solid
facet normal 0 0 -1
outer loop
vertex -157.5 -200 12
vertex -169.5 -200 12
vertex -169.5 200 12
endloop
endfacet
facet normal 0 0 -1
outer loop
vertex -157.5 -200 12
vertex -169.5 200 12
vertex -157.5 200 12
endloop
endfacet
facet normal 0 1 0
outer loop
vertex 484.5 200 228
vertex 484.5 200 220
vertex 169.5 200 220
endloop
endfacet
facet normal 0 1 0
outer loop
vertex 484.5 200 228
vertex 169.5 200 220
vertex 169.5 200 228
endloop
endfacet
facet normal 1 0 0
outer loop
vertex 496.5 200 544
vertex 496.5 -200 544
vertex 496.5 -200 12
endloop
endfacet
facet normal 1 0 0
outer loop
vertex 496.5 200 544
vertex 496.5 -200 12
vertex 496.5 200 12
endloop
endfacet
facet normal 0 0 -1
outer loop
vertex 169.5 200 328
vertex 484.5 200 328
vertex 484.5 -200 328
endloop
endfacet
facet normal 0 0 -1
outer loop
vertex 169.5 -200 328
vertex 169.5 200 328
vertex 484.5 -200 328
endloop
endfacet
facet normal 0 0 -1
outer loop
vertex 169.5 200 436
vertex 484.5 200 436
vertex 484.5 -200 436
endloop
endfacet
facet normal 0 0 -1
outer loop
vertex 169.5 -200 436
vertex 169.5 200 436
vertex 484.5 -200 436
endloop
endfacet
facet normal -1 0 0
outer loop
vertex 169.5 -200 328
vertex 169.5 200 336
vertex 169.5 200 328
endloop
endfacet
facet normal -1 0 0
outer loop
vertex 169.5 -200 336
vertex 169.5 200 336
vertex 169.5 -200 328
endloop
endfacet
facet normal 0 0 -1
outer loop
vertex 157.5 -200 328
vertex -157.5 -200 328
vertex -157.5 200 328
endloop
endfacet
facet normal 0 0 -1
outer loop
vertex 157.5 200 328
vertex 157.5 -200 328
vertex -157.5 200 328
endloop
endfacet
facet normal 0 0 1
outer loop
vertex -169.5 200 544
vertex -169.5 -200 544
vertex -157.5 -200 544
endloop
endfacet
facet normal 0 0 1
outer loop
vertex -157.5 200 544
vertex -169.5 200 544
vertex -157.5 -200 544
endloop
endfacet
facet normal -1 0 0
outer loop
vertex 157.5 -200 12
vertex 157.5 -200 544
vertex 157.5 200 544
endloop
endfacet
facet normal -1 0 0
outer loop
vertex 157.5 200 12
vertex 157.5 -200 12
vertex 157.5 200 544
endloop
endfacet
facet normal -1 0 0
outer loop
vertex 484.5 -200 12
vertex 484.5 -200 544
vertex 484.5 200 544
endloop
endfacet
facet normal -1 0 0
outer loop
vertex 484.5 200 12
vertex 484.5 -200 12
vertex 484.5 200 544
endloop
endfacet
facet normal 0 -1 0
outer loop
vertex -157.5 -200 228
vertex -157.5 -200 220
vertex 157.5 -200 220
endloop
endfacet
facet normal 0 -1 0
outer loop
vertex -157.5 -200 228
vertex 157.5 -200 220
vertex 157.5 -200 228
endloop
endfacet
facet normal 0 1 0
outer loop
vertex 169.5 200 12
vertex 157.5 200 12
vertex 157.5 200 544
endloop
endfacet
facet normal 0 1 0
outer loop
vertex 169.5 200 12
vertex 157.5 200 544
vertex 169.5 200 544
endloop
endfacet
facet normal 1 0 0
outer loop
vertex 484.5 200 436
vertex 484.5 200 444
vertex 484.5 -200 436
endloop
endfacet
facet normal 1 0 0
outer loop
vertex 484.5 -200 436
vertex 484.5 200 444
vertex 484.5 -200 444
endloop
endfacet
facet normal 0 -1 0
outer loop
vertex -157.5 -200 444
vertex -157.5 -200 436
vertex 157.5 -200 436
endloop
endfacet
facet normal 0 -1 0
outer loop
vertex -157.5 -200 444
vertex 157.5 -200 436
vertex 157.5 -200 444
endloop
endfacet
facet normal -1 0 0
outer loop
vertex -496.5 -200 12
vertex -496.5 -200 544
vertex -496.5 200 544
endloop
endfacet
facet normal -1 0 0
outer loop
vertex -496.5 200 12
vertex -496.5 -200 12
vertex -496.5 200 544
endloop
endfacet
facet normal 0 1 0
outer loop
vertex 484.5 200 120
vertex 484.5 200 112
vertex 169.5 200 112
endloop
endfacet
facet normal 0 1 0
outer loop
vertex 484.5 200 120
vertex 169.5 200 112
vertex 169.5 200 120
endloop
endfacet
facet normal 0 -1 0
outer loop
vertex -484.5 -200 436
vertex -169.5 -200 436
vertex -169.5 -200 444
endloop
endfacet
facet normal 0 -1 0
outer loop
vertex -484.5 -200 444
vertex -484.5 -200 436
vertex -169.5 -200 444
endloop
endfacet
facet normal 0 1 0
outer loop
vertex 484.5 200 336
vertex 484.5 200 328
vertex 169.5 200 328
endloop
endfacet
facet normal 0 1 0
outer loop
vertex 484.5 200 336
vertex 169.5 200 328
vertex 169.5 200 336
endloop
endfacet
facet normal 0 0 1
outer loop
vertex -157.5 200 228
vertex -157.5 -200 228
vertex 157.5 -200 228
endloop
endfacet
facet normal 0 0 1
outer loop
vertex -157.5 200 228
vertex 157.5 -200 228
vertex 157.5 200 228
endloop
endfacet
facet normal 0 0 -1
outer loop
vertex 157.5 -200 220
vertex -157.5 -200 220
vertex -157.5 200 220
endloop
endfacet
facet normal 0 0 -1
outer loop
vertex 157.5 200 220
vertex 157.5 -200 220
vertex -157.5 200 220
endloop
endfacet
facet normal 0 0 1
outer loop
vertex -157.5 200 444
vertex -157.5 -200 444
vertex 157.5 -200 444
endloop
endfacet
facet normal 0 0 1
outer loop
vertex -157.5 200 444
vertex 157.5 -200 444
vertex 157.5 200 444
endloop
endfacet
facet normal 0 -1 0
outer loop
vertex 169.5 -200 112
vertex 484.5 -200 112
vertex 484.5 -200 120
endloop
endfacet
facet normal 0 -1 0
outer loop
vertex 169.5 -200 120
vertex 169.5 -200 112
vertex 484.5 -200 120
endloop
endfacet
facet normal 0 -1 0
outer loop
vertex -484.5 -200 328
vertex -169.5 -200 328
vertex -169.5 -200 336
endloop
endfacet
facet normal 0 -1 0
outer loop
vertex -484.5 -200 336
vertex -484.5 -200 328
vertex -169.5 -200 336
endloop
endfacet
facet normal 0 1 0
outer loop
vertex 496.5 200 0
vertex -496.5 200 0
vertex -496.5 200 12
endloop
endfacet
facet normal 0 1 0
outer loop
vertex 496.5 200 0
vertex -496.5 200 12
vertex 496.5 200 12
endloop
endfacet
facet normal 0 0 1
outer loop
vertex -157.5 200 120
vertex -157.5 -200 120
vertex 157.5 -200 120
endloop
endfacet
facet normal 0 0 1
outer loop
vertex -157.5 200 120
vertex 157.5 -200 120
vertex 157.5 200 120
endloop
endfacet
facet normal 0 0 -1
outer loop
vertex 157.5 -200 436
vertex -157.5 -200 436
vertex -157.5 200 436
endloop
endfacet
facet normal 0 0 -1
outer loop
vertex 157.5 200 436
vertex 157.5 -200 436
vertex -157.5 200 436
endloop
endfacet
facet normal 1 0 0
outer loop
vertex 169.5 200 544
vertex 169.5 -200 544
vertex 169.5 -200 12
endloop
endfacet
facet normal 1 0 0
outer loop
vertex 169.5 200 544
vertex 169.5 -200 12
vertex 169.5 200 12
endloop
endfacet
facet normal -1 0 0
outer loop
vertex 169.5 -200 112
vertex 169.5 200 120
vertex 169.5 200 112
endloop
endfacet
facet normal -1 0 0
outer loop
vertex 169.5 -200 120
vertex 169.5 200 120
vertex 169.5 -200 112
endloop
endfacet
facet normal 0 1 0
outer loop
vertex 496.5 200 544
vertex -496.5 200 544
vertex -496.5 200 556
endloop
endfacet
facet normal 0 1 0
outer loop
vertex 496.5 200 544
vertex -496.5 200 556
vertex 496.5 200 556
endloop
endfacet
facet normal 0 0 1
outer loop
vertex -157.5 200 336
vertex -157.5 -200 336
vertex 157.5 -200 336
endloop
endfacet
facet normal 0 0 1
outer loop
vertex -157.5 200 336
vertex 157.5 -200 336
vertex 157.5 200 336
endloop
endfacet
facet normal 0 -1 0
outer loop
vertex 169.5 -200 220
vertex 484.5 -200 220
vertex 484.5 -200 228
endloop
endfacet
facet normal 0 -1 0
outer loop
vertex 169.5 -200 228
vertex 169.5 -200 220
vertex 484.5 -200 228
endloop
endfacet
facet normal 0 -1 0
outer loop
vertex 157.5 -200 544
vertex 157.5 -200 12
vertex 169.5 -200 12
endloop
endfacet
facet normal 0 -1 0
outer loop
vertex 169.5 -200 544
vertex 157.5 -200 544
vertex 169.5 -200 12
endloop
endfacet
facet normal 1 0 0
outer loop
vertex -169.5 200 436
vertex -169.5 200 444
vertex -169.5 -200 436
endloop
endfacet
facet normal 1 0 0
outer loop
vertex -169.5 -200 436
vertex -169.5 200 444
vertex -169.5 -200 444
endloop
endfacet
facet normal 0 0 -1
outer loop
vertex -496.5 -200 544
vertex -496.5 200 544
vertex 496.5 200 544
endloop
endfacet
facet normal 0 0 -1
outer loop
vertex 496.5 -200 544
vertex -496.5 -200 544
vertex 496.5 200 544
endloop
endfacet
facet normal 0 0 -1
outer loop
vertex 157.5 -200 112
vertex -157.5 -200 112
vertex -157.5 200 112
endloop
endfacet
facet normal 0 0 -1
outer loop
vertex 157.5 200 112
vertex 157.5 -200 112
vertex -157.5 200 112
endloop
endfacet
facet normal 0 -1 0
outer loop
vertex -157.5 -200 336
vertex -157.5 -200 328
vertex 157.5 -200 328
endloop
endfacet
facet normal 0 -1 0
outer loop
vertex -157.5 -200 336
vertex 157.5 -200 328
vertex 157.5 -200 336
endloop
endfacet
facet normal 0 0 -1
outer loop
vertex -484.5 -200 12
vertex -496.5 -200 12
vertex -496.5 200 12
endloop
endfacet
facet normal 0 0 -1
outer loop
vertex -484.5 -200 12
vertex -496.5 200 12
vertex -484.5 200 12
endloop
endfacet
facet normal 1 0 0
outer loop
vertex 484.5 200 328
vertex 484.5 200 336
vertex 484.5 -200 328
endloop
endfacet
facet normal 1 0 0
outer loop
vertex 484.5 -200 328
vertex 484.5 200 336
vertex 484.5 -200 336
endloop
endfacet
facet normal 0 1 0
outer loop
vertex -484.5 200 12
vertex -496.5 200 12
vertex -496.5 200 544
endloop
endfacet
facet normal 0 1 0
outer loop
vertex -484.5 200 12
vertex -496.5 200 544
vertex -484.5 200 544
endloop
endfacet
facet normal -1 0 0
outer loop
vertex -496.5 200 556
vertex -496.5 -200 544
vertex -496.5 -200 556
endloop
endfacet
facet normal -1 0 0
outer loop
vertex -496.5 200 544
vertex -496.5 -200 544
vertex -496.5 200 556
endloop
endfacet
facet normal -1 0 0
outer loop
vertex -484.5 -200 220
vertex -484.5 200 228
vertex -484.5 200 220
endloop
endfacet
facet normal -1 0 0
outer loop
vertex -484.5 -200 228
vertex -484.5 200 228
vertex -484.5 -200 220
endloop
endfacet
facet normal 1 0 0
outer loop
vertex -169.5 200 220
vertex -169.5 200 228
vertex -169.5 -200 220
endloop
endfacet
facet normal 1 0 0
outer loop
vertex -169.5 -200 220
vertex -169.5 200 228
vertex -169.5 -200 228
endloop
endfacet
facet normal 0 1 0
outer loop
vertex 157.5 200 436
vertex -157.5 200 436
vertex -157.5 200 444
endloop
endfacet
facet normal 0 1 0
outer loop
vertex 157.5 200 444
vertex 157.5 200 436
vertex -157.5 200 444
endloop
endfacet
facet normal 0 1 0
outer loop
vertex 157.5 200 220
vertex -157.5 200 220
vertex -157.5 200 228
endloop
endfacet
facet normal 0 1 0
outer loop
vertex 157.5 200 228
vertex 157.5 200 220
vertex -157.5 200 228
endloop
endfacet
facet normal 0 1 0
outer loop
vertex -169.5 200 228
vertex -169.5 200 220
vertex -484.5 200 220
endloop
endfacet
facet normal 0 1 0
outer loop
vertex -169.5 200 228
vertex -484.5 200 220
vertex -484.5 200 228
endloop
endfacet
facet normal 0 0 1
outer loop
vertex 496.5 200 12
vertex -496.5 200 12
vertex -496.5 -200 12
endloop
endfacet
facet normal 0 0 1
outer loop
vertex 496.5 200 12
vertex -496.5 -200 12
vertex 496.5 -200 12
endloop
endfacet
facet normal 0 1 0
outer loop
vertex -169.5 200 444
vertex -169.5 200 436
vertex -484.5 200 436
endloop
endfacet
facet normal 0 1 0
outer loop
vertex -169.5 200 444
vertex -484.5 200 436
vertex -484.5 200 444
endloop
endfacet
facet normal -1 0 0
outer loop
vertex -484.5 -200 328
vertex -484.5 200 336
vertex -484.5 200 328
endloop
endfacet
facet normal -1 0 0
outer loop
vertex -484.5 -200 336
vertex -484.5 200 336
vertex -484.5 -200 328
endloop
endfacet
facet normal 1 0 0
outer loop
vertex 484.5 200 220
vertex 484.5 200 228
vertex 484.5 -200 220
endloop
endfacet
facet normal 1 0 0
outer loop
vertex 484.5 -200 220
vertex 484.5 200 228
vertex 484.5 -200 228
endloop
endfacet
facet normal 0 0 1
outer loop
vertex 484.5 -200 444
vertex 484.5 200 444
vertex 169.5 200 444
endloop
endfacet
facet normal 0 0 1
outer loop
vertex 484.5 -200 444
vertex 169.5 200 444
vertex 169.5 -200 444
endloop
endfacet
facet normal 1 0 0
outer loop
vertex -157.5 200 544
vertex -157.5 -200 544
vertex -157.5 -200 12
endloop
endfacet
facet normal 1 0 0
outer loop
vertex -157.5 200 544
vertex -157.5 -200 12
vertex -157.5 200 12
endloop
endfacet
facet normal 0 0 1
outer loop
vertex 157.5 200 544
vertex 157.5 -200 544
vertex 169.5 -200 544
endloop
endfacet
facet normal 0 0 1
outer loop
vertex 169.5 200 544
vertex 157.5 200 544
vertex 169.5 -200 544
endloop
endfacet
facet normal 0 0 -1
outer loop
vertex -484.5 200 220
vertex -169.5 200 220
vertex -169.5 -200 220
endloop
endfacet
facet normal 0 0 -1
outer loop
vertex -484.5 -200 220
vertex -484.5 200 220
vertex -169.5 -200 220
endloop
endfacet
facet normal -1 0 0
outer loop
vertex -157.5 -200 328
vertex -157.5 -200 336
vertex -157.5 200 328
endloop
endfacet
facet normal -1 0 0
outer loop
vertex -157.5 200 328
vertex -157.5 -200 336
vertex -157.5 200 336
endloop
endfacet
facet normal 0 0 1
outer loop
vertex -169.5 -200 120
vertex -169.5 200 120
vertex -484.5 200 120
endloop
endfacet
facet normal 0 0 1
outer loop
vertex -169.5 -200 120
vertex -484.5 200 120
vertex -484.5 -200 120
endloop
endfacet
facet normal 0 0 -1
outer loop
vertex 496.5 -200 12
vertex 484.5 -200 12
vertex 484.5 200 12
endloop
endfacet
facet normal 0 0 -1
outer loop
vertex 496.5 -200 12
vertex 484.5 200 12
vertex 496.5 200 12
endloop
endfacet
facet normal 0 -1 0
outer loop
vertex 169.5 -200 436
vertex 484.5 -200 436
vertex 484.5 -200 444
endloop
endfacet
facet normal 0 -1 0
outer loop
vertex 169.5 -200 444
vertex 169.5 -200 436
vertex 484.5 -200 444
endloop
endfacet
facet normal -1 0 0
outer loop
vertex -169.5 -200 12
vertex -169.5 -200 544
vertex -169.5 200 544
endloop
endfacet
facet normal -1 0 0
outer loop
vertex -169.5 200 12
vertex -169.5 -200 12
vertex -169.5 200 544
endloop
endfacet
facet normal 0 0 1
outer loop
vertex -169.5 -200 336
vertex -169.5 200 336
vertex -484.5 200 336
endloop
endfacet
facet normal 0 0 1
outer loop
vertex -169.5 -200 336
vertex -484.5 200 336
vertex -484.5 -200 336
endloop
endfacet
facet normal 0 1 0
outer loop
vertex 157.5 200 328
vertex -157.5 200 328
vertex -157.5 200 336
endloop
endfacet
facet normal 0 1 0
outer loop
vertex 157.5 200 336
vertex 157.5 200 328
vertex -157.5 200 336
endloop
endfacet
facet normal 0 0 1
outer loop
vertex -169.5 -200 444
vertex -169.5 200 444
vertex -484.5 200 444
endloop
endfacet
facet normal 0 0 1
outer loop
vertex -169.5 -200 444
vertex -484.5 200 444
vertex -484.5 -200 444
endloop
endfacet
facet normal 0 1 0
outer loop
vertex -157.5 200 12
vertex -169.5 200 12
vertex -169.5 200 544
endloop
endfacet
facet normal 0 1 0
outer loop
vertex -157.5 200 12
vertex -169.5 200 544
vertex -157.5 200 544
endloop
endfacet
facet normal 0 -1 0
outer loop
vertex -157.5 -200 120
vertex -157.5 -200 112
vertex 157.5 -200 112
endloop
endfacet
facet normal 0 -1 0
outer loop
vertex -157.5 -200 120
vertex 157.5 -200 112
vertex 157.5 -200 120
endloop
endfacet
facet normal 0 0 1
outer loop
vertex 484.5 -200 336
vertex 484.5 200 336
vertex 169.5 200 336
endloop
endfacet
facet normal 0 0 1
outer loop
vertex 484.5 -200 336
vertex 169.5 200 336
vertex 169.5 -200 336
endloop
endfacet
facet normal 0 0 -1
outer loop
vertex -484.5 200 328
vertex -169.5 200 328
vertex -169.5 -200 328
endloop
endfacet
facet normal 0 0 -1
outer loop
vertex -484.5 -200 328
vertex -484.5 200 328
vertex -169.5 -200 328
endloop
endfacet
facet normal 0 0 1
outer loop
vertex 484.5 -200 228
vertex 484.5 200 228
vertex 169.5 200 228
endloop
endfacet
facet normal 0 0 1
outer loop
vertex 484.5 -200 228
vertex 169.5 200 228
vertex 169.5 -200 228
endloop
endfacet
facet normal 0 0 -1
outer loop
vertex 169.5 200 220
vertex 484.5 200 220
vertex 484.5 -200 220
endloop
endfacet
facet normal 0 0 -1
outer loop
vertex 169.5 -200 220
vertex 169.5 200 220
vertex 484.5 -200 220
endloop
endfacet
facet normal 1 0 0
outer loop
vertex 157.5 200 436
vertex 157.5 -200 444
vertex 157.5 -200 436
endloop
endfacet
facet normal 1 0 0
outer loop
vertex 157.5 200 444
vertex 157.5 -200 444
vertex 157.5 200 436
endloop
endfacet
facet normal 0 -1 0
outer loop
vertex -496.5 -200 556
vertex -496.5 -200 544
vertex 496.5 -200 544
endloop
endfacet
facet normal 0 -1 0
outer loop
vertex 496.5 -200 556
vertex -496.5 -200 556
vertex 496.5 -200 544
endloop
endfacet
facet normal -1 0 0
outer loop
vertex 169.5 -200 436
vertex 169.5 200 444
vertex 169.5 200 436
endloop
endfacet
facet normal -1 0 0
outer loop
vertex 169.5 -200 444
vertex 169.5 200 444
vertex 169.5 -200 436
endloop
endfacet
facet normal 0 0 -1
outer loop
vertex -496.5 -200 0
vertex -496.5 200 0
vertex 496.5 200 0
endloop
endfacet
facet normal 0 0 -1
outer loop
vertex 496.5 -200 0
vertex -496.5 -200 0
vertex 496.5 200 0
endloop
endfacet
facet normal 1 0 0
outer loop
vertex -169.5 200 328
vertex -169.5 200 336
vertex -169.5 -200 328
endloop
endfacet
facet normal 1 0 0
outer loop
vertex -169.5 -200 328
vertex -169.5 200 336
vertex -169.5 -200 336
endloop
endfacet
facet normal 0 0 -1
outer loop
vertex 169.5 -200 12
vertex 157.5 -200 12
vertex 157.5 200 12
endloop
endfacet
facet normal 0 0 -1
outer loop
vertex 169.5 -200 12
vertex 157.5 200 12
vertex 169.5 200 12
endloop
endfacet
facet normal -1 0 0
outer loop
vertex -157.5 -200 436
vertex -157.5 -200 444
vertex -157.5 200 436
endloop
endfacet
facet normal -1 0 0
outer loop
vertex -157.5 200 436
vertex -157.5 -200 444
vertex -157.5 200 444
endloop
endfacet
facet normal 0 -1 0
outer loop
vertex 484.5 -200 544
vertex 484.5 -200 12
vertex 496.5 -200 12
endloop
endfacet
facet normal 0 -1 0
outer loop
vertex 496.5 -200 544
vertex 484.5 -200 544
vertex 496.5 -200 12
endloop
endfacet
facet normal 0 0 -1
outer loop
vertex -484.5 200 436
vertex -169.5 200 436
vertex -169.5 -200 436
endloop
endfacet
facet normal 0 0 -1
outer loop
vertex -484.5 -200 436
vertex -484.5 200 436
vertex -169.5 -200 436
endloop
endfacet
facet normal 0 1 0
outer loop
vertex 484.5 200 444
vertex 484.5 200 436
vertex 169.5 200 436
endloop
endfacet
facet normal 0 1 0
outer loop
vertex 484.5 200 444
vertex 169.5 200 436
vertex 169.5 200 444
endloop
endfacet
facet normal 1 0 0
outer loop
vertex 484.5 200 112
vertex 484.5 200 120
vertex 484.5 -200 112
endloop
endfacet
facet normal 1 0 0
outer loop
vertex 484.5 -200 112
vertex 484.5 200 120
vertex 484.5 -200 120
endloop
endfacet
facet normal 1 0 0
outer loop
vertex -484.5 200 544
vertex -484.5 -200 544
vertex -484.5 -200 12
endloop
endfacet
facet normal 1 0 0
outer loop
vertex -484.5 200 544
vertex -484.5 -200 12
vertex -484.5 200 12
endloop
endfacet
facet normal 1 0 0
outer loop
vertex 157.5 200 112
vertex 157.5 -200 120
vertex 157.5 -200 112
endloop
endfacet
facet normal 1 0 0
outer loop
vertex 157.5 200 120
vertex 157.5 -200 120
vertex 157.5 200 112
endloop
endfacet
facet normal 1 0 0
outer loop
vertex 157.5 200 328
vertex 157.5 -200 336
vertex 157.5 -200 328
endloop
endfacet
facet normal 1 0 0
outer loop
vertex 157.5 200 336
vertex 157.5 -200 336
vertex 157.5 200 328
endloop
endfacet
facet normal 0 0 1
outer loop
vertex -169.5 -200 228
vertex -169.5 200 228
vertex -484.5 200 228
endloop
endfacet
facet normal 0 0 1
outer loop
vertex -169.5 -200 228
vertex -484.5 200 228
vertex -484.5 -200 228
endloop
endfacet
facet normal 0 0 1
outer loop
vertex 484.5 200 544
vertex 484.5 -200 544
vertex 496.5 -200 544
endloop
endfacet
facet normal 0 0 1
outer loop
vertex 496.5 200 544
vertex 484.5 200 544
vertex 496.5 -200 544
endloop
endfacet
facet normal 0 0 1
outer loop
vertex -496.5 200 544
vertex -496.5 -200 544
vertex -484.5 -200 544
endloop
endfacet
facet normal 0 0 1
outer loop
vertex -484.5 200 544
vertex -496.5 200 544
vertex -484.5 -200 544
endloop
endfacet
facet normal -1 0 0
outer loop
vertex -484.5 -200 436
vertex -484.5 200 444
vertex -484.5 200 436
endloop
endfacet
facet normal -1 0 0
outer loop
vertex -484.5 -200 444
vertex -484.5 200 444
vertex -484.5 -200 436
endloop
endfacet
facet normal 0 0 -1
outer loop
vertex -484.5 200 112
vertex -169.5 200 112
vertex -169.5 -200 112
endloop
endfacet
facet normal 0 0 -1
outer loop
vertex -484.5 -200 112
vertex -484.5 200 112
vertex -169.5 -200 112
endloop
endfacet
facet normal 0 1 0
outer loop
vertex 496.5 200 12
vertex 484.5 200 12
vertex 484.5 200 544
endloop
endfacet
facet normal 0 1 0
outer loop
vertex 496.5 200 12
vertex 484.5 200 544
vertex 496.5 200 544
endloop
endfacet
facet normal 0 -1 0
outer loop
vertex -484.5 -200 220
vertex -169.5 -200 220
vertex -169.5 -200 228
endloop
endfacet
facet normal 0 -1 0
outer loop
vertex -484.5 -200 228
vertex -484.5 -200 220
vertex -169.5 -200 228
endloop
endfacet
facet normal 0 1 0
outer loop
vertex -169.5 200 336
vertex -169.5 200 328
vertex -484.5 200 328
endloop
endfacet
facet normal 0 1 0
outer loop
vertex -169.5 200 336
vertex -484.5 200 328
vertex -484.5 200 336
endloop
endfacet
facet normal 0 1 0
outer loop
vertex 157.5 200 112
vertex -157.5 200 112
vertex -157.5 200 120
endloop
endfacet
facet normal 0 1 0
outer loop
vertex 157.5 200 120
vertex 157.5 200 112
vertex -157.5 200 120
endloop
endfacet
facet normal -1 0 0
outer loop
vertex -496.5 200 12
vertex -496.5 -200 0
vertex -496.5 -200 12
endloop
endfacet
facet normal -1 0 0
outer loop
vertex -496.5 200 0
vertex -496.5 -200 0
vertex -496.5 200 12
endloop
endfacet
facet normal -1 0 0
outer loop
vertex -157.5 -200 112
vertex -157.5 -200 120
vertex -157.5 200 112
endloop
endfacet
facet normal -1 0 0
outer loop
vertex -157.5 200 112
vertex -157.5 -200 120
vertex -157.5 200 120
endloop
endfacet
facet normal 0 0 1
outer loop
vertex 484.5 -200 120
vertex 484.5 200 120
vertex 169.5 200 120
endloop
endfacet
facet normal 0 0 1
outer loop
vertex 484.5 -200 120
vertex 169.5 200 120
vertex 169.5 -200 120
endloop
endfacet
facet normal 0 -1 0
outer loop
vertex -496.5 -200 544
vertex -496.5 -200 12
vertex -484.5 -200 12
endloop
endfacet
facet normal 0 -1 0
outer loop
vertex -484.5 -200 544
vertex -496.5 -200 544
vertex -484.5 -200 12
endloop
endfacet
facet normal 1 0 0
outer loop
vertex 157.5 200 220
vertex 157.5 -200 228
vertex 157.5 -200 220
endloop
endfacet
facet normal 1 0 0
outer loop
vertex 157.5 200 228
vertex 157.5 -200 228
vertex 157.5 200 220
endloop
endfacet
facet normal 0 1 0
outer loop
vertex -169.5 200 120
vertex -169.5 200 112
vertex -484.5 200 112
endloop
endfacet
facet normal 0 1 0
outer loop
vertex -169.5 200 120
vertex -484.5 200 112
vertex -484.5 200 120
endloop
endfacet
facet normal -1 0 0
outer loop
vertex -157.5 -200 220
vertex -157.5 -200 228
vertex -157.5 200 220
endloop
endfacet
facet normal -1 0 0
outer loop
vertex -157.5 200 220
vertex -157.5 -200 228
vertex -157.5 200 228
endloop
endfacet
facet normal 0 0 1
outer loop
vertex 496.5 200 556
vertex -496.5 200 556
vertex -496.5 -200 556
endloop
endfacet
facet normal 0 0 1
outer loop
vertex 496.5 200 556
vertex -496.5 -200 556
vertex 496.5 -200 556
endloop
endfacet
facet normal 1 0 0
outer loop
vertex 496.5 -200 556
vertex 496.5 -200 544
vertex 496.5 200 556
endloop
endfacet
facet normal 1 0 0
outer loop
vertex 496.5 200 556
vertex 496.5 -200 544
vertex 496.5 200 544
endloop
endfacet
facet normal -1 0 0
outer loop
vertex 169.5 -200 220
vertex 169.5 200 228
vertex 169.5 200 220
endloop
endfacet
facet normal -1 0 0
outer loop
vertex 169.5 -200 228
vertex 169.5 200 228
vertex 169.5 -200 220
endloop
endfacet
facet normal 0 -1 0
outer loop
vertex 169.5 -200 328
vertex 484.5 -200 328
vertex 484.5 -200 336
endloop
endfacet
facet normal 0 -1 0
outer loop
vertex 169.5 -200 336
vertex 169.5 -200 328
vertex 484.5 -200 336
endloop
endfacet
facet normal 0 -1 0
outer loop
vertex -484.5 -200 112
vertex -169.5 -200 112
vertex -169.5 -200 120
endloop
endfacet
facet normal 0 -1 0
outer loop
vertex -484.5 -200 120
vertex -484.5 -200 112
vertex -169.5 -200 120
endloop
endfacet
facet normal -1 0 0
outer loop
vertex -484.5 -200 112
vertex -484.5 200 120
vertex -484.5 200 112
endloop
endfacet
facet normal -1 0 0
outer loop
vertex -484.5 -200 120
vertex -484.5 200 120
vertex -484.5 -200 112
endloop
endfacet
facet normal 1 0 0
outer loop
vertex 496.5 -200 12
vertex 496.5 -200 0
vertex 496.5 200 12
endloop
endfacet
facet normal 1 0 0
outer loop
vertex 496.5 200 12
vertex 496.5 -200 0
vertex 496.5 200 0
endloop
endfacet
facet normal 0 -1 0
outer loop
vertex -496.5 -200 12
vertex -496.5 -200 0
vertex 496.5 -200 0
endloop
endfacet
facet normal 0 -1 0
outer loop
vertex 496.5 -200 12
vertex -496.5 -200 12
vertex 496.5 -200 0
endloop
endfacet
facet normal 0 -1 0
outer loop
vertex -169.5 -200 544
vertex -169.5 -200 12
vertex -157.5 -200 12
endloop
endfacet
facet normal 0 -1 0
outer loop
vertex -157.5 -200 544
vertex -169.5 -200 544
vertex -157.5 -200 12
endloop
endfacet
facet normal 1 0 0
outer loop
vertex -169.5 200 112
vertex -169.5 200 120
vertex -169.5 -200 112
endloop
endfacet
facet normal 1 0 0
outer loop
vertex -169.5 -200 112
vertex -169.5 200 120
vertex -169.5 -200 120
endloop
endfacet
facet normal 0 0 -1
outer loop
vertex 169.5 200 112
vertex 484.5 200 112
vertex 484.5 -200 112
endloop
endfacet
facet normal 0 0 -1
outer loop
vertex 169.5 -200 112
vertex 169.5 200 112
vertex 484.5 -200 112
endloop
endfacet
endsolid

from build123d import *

# Parameters (mm, degrees)
F0_W      = 993
F0_H      = 400
F1_DEPTH  = 12
F2_W      = 12
F2_H      = 400
F3_DEPTH  = 532
F4_W      = 993
F4_H      = 400
F5_DEPTH  = 12
F6_W      = 12
F6_H      = 400
F7_DEPTH  = 532
F8_W      = 400
F8_H      = 8
F9_DEPTH  = 315
F10_W     = 400
F10_H     = 8
F11_DEPTH = 315
F12_W     = 400
F12_H     = 8
F13_DEPTH = 315


with BuildPart() as f1:
    # F0 (on Top) → F1 (new body)
    with BuildSketch(Plane.XY):
        Rectangle(F0_W, F0_H)
    extrude(amount=F1_DEPTH)


with BuildPart() as f3:
    # F2 (on face) → F3 (new body)
    with BuildSketch(Plane.XY.offset(12)):
        with Locations((-490.5, 0)):
            Rectangle(F2_W, F2_H)
        with Locations((490.5, 0)):
            Rectangle(F2_W, F2_H)
    extrude(amount=F3_DEPTH)


with BuildPart() as f5:
    # F4 (on face) → F5 (new body)
    with BuildSketch(Plane.XY.offset(544)):
        Rectangle(F4_W, F4_H)
    extrude(amount=F5_DEPTH)


with BuildPart() as f7:
    # F6 (on face) → F7 (new body)
    with BuildSketch(Plane.XY.offset(12)):
        with Locations((-163.5, 0)):
            Rectangle(F6_W, F6_H)
        with Locations((163.5, 0)):
            Rectangle(F6_W, F6_H)
    extrude(amount=F7_DEPTH)


with BuildPart() as f9:
    # F8 (on face) → F9 (new body)
    with BuildSketch(Plane.YZ.offset(-157.5)):
        with Locations((0, 116)):
            Rectangle(F8_W, F8_H)
        with Locations((0, 224)):
            Rectangle(F8_W, F8_H)
        with Locations((0, 332)):
            Rectangle(F8_W, F8_H)
        with Locations((0, 440)):
            Rectangle(F8_W, F8_H)
    extrude(amount=F9_DEPTH)


with BuildPart() as f11:
    # F10 (on face) → F11 (new body)
    with BuildSketch(Plane(origin=(484.5, 0, 0), x_dir=(0, -1, 0), z_dir=(-1, 0, 0))):
        with Locations((0, 116)):
            Rectangle(F10_W, F10_H)
        with Locations((0, 224)):
            Rectangle(F10_W, F10_H)
        with Locations((0, 332)):
            Rectangle(F10_W, F10_H)
        with Locations((0, 440)):
            Rectangle(F10_W, F10_H)
    extrude(amount=F11_DEPTH)


with BuildPart() as f13:
    # F12 (on face) → F13 (new body)
    with BuildSketch(Plane(origin=(-169.5, 0, 0), x_dir=(0, -1, 0), z_dir=(-1, 0, 0))):
        with Locations((0, 116)):
            Rectangle(F12_W, F12_H)
        with Locations((0, 224)):
            Rectangle(F12_W, F12_H)
        with Locations((0, 332)):
            Rectangle(F12_W, F12_H)
        with Locations((0, 440)):
            Rectangle(F12_W, F12_H)
    extrude(amount=F13_DEPTH)


solid = Compound([f1.part, f3.part, f5.part, f7.part, f9.part, f11.part, f13.part])
